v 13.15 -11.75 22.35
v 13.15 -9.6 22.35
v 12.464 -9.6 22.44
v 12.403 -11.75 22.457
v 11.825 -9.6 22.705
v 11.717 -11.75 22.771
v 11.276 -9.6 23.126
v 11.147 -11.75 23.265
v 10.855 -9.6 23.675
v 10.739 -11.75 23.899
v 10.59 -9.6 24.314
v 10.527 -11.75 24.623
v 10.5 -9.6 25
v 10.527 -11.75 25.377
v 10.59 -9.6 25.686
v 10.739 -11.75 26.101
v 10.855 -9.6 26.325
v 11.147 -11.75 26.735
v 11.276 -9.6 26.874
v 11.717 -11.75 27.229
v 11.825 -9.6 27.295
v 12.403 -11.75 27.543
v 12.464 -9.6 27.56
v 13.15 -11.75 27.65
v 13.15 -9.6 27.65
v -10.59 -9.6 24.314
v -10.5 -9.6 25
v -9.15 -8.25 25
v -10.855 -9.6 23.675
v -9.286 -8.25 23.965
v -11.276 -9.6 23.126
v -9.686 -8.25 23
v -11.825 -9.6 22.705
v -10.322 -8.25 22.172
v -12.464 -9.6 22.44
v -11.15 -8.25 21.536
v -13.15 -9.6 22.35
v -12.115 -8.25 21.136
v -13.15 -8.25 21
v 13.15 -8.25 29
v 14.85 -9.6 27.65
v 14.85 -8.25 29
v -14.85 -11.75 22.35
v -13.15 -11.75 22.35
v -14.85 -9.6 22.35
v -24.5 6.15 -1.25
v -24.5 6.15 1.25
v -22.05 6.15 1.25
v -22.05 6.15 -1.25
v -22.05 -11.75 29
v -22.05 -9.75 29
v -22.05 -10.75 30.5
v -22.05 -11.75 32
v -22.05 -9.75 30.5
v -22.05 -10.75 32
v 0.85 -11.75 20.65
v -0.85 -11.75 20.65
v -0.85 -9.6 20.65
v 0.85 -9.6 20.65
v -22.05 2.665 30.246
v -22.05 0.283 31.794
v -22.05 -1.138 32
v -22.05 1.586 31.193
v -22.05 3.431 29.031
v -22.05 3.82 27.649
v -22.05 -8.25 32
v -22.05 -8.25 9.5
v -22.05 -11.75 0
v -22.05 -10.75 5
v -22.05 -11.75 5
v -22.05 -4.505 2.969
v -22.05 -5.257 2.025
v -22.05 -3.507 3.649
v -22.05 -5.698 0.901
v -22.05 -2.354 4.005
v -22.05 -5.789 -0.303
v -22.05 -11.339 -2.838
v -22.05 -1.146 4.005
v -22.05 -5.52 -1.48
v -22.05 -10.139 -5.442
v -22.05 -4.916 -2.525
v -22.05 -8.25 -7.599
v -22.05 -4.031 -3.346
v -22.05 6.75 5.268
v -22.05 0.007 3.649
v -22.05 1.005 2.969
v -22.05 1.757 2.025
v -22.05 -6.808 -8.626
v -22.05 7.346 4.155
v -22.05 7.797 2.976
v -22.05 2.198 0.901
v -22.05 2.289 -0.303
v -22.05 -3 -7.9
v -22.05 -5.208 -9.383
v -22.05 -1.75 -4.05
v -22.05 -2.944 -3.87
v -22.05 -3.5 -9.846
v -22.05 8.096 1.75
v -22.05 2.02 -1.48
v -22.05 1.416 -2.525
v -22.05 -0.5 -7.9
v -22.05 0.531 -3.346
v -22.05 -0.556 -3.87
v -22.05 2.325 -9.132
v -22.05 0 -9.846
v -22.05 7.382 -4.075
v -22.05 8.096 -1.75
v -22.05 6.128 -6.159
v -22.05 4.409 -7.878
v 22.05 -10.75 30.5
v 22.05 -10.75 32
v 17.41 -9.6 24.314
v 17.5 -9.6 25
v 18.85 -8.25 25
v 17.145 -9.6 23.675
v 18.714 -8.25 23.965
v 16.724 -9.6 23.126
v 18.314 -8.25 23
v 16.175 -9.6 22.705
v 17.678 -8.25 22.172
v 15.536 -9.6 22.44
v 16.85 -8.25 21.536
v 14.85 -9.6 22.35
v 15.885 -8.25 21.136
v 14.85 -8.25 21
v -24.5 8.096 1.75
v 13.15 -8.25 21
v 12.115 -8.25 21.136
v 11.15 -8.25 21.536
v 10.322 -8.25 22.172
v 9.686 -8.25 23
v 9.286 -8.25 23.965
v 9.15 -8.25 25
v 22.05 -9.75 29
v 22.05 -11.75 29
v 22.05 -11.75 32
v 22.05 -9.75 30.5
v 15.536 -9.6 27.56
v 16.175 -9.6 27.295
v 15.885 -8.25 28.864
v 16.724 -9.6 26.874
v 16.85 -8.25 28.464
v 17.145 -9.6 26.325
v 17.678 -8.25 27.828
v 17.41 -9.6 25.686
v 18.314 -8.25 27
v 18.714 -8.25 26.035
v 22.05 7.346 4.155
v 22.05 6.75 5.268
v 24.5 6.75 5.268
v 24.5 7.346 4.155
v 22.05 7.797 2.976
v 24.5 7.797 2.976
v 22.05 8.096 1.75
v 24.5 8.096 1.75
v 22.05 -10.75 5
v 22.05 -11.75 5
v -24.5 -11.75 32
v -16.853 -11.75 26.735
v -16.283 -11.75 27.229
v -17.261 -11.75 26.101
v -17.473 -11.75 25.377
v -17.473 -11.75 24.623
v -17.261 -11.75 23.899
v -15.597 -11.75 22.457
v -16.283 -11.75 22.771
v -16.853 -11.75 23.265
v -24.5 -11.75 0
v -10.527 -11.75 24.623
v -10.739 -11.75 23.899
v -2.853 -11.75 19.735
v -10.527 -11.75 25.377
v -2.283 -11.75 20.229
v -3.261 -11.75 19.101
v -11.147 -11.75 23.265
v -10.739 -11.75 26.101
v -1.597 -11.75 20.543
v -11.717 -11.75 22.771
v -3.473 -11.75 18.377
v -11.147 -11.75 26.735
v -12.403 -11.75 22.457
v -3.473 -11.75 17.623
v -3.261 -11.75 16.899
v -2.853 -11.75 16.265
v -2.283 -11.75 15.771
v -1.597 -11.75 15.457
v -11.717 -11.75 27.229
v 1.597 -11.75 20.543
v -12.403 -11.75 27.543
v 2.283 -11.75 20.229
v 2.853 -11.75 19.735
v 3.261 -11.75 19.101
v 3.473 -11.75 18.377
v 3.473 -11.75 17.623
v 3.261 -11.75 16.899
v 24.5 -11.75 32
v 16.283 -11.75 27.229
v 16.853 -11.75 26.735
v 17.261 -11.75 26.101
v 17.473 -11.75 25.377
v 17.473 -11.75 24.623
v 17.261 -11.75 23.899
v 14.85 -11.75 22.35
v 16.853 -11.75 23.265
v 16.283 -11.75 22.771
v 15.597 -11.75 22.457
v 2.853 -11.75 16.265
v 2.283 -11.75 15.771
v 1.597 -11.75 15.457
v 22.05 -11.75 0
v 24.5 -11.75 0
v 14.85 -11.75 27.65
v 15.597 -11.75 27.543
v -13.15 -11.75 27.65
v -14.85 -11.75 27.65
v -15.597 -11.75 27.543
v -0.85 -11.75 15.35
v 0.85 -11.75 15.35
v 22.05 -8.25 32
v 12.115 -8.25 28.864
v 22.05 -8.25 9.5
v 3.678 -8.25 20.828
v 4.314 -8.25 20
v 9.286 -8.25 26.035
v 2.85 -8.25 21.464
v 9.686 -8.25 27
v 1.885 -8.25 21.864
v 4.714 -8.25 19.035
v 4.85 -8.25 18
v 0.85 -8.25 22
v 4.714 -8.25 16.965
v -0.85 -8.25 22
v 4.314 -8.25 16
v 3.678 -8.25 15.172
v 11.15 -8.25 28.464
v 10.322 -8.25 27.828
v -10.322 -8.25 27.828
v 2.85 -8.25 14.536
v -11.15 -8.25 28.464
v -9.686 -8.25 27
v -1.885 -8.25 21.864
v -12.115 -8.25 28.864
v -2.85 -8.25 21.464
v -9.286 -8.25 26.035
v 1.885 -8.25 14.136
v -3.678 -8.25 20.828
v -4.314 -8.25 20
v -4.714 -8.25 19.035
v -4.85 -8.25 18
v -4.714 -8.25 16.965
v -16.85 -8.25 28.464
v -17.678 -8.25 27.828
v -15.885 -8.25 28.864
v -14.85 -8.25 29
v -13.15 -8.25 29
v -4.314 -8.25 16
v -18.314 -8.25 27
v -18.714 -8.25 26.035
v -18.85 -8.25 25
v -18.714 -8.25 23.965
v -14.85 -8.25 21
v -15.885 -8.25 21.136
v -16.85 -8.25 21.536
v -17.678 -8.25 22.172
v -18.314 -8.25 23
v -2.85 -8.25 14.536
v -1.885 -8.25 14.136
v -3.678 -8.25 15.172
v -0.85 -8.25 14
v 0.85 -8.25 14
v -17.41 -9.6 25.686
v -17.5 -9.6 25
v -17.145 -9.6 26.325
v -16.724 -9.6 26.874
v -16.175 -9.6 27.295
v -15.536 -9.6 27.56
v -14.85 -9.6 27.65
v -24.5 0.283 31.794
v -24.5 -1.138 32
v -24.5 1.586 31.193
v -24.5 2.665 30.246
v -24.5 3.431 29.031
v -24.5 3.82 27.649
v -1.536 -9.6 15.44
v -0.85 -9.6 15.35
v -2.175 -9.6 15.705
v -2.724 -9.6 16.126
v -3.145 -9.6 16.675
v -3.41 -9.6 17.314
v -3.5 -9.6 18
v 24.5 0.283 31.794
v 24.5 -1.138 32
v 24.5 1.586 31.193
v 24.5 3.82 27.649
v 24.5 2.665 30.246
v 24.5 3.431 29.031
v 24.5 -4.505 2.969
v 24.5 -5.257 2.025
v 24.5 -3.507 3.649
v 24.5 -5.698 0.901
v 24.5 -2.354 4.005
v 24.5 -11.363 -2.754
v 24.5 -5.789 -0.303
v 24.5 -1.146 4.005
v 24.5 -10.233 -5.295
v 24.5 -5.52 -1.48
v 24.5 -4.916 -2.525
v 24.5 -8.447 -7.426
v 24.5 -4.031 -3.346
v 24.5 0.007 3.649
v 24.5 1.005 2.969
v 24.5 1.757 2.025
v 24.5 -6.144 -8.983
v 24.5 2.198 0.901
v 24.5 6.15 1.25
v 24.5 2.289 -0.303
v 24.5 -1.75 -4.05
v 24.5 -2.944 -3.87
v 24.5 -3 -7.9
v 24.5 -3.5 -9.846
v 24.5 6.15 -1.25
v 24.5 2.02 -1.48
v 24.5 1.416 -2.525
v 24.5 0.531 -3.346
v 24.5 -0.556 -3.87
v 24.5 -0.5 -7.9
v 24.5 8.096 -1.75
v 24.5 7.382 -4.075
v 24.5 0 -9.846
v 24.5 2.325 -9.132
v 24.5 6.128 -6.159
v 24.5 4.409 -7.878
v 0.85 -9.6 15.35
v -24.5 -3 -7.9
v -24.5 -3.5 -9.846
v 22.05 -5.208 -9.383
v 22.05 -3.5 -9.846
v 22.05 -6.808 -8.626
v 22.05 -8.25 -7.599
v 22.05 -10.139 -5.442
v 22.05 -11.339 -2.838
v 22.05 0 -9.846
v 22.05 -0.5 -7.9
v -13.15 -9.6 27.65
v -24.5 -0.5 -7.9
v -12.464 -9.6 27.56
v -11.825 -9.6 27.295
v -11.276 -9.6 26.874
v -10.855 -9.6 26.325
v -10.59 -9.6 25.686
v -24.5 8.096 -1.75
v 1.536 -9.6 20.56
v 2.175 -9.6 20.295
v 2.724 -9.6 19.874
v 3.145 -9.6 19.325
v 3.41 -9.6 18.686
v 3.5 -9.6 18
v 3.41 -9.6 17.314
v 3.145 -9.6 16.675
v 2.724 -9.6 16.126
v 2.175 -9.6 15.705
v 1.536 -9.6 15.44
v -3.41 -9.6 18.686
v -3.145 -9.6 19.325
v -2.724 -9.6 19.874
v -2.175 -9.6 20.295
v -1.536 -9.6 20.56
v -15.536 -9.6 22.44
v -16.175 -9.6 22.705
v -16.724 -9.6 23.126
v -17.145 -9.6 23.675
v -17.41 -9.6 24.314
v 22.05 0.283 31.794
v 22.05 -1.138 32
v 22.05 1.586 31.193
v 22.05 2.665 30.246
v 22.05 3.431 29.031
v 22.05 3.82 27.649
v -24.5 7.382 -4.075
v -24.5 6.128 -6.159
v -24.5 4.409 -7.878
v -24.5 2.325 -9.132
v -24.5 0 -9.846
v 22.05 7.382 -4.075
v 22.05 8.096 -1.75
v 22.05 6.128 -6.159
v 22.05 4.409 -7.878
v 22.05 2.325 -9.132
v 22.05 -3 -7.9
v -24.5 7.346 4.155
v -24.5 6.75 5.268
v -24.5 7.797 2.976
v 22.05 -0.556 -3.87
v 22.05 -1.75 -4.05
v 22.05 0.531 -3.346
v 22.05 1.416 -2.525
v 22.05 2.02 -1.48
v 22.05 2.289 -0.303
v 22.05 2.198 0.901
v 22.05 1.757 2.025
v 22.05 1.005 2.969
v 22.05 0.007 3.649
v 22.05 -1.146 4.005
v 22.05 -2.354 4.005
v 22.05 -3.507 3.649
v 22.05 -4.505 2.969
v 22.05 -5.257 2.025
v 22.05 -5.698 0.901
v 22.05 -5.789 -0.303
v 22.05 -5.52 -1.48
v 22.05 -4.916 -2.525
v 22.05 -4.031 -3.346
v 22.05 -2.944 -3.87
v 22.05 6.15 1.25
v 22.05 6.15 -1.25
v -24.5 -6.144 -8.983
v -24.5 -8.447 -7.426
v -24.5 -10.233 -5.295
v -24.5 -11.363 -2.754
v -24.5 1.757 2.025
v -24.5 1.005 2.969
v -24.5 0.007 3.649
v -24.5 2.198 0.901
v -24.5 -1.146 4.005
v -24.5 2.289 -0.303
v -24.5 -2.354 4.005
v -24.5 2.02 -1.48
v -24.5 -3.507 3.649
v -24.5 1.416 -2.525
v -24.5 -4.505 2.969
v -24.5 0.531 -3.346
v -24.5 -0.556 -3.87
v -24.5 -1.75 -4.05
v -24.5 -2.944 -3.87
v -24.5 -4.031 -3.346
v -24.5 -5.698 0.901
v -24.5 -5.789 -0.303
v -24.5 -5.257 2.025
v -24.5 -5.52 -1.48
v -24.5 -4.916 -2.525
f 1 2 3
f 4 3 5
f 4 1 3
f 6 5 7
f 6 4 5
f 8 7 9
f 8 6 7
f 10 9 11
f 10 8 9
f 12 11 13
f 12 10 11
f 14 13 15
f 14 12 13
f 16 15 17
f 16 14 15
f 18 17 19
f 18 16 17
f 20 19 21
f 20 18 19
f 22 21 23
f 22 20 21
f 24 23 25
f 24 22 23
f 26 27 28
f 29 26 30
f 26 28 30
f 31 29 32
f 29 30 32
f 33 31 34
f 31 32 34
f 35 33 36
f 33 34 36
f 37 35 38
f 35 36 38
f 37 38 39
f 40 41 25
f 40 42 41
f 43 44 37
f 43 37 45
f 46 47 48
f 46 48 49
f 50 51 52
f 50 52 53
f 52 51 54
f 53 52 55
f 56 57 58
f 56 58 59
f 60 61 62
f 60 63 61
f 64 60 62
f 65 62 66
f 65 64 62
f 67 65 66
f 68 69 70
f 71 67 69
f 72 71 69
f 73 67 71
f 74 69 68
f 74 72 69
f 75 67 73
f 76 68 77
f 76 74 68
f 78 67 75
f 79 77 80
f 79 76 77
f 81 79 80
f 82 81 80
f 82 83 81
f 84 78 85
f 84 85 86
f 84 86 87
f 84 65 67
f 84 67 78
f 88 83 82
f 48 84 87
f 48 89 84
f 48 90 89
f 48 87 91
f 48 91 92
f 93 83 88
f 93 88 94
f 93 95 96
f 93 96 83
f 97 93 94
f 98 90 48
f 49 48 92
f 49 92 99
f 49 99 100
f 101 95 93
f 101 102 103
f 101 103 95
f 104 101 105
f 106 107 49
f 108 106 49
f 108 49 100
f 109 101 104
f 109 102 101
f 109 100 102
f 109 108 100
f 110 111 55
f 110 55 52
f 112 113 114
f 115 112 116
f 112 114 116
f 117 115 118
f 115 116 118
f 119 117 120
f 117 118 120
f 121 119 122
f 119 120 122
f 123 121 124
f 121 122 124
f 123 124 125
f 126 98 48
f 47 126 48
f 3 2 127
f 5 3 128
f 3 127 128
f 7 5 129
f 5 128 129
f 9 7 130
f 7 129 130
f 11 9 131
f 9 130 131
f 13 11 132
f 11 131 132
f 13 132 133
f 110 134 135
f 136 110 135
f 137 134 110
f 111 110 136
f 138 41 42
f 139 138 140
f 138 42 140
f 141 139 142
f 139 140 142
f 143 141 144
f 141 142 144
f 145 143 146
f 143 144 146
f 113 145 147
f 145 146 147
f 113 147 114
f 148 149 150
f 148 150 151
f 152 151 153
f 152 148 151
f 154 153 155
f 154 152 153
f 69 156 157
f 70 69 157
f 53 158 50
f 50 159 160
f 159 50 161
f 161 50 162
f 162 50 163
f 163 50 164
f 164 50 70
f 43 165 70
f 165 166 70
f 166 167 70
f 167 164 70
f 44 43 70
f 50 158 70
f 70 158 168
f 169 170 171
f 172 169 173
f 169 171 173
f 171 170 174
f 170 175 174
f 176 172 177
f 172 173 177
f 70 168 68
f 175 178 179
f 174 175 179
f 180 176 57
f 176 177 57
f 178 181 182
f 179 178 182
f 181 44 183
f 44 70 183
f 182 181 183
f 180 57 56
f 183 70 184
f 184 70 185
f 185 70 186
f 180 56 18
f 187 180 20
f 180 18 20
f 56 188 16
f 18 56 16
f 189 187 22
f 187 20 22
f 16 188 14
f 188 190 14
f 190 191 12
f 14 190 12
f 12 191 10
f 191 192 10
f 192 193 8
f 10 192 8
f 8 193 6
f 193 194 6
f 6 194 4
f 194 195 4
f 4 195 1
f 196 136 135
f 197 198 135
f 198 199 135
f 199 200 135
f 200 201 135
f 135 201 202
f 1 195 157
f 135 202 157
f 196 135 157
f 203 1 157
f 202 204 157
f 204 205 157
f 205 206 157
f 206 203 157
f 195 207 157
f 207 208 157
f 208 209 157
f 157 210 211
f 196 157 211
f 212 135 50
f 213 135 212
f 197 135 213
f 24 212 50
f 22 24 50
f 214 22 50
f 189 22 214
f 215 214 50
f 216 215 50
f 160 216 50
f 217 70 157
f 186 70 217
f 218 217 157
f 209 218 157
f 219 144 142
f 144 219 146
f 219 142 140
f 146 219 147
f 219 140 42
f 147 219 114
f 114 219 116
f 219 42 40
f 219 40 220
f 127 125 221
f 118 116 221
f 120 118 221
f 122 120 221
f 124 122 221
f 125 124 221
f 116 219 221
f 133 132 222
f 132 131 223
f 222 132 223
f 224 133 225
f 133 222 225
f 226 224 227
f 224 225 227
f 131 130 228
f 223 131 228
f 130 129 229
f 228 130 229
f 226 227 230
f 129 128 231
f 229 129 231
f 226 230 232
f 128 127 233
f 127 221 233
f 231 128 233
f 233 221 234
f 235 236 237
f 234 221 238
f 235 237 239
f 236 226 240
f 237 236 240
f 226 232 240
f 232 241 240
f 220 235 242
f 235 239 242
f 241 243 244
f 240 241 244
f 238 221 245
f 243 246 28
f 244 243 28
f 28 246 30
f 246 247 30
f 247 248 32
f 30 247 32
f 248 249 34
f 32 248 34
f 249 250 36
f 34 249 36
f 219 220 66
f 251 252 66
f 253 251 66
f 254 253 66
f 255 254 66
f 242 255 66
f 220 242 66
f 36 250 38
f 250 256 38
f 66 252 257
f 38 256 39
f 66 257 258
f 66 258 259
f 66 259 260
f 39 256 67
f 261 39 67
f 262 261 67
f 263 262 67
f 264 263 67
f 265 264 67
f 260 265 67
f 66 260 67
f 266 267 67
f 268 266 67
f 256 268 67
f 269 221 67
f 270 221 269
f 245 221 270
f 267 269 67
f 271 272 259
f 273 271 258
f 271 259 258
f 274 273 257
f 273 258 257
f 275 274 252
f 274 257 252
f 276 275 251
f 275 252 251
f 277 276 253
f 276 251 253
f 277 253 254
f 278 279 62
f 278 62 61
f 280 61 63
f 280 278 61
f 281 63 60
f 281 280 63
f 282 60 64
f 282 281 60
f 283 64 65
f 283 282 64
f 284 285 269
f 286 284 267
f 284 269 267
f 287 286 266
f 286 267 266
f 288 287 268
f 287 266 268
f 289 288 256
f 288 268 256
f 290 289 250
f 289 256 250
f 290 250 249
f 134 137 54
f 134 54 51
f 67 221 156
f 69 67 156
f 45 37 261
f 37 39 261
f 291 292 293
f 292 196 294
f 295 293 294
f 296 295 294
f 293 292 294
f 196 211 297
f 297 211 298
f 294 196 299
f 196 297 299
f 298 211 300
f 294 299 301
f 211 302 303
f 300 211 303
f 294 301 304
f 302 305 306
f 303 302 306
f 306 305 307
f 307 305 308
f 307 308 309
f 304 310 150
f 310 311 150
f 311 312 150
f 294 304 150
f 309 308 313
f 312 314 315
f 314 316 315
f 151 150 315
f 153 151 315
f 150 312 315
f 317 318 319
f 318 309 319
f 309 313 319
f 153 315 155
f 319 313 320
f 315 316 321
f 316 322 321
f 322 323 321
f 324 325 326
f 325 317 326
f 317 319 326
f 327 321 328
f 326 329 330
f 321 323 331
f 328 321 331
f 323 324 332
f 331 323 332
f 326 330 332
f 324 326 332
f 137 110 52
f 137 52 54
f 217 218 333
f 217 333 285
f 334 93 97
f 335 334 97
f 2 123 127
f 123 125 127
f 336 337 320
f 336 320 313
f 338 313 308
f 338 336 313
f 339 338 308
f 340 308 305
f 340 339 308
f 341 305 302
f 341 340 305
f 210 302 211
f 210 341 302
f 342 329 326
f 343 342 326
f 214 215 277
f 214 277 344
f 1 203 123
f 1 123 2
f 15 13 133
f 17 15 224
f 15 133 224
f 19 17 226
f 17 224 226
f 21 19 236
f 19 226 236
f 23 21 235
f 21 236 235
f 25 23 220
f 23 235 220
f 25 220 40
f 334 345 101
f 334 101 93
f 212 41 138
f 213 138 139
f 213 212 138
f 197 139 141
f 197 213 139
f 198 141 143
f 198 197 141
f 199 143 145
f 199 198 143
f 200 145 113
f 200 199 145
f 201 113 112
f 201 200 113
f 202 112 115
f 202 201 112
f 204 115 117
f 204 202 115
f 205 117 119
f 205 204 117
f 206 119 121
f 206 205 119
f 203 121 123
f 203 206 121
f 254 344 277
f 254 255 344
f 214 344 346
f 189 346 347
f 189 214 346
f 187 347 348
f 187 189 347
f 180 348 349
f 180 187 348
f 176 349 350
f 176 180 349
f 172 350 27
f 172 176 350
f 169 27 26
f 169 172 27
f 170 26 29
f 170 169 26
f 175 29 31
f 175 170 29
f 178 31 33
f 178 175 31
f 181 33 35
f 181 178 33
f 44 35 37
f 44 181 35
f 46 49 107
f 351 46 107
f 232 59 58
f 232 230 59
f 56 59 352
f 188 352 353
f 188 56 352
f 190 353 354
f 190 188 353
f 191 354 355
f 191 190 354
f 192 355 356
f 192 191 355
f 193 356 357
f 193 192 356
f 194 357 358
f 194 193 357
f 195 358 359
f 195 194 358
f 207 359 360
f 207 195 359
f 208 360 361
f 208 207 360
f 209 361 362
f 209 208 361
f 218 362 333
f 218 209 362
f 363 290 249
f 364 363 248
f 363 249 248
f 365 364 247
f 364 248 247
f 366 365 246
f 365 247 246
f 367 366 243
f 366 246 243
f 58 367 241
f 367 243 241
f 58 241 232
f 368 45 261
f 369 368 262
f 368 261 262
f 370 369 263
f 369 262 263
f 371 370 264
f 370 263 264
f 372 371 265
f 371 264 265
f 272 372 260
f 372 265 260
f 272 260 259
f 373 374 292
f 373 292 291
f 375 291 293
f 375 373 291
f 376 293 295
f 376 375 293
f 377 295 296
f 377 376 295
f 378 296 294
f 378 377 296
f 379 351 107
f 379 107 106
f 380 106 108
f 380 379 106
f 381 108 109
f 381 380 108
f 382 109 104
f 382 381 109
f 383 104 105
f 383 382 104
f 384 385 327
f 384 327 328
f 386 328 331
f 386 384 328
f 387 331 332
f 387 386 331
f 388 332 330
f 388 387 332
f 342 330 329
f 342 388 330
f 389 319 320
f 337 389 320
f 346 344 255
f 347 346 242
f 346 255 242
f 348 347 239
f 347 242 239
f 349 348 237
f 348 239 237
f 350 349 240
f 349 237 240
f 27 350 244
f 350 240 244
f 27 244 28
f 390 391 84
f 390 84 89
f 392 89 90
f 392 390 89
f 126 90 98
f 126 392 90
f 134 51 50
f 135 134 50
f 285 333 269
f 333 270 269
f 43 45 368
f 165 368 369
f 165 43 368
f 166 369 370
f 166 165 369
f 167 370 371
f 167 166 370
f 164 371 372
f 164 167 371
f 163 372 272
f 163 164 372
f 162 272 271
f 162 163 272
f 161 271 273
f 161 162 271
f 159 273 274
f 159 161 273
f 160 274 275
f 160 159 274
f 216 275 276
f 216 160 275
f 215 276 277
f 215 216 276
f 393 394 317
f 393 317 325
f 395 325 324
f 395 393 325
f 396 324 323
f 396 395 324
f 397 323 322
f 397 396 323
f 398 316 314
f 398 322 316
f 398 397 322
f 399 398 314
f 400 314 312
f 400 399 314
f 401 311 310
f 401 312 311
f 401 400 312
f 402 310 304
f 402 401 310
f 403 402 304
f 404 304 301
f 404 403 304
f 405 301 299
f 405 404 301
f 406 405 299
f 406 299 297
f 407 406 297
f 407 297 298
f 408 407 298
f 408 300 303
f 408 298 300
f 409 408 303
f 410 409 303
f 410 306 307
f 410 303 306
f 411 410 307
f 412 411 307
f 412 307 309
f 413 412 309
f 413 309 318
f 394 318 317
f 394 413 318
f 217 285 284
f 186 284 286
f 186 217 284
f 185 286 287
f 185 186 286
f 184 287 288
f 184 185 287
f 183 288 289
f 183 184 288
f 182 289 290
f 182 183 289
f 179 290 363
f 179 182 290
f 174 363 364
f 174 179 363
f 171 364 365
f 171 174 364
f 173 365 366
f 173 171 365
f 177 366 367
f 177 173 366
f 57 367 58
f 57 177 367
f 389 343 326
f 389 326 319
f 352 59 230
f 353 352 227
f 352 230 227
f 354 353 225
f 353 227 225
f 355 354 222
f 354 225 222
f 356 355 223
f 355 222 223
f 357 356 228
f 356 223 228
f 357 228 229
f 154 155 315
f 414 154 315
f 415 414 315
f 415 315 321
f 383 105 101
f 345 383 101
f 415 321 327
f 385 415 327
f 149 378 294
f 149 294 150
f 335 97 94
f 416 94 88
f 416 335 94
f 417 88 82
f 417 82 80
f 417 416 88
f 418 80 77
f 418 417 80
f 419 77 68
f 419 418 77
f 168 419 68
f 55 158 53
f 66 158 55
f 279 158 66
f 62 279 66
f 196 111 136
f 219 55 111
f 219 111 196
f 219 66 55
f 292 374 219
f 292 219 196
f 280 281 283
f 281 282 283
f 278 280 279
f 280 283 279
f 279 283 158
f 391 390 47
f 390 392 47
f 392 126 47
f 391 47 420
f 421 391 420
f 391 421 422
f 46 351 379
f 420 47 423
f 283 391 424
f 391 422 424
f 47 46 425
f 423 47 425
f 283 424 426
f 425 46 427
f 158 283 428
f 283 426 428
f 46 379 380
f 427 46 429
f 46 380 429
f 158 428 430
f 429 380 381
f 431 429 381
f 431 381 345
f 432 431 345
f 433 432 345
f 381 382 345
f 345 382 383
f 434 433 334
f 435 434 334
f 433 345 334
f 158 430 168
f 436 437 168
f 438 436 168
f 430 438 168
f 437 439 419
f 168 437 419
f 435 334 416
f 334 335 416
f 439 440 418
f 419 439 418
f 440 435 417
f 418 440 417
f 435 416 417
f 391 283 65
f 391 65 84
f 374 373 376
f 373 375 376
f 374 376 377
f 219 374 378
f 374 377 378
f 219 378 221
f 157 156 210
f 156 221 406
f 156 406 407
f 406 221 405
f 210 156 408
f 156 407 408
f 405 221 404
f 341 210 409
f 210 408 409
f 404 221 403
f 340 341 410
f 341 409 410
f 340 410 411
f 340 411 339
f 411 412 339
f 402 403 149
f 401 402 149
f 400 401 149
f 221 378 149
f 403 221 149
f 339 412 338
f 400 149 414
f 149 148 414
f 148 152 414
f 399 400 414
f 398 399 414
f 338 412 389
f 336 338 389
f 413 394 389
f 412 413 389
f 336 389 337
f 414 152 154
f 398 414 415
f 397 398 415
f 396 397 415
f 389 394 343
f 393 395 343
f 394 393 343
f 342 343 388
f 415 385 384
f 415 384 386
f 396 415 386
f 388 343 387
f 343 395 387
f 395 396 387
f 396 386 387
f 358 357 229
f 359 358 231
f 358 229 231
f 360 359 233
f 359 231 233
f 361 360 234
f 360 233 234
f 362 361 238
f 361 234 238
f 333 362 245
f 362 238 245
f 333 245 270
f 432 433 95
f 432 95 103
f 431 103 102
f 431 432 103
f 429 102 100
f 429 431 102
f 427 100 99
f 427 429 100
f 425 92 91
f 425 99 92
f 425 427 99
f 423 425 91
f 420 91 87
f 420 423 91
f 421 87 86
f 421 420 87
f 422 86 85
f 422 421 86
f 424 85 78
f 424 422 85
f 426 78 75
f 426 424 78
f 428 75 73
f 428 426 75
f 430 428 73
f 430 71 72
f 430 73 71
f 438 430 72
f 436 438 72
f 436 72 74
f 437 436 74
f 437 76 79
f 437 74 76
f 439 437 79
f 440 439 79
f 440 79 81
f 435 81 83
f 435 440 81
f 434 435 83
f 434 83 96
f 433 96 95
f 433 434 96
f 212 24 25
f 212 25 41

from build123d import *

# Parameters (mm, degrees)
BODY_DEPTH                       = 32
BODY_DEPTH_BACK                  = 15
PIVOT_HOLE_DEPTH                 = 42.979905907
PIVOT_HOLE_DEPTH_BACK            = 42.979905907
PIVOT_HOLE_SKETCH_R              = 4.05
OUTSIDE_SHAPE_CUT_OUT_DEPTH      = 42.979905907
OUTSIDE_SHAPE_CUT_OUT_DEPTH_BACK = 42.979905907
OUTSIDE_SHAPE_CUT_OUT_SKETCH_W   = 49
OUTSIDE_SHAPE_CUT_OUT_SKETCH_H   = 22
INSIDE_START                     = 22.05
INSIDE_SHAPE_CUT_OUT_DEPTH       = 44.1
F_3_START                        = -11.75
F_3_M5_SLOTS_DEPTH               = 3.5


with BuildPart() as part:
    # Profile Sketch → Body (new, two sides: drawn at the far end of the back side and taken through both)
    with BuildSketch(Plane.XY.offset(-BODY_DEPTH_BACK)):
        Polygon((-24.5, -11.75), (24.5, -11.75), (24.5, 8.25), (22.05, 8.25), (22.05, -8.25), (-22.05, -8.25), (-22.05, 8.25), (-24.5, 8.25), align=None)
    extrude(amount=BODY_DEPTH + BODY_DEPTH_BACK)

    # Pivot Hole Sketch → Pivot Hole (cut, two sides: drawn at the far end of the back side and taken through both)
    with BuildSketch(Plane(origin=(0, 0, 0), x_dir=(0, 0, -1), z_dir=(1, 0, 0)).offset(-PIVOT_HOLE_DEPTH_BACK)):
        with Locations((0, -1.75)):
            Circle(PIVOT_HOLE_SKETCH_R)
    extrude(amount=PIVOT_HOLE_DEPTH + PIVOT_HOLE_DEPTH_BACK, mode=Mode.SUBTRACT)

    # Outside Shape Cut Out Sketch → Outside Shape Cut Out (cut, two sides: drawn at the far end of the back side and taken through both)
    with BuildSketch(Plane(origin=(0, 0, 0), x_dir=(0, 0, -1), z_dir=(1, 0, 0)).offset(-OUTSIDE_SHAPE_CUT_OUT_DEPTH_BACK)):
        with Locations((-9.5, -2.75)):
            Rectangle(OUTSIDE_SHAPE_CUT_OUT_SKETCH_W, OUTSIDE_SHAPE_CUT_OUT_SKETCH_H)
        with BuildLine():
            Line((-27.649101987, 3.819656009), (-5.267826876, 6.75))
            ThreePointArc((-5.267826876, 6.75), (-3.57284062, 7.589957703), (-1.75, 8.095684334))
            Line((-1.75, 8.095684334), (-1.25, 6.15))
            Line((-1.25, 6.15), (1.25, 6.15))
            Line((1.25, 6.15), (1.75, 8.095684334))
            ThreePointArc((1.75, 8.095684334), (7.071067812, 5.321067812), (9.845684334, 0))
            Line((9.845684334, 0), (7.9, -0.5))
            Line((7.9, -0.5), (7.9, -3))
            Line((7.9, -3), (9.845684334, -3.5))
            ThreePointArc((9.845684334, -3.5), (6.422616289, -9.414854858), (0, -11.75))
            Line((0, -11.75), (-32, -11.75))
            Line((-32, -11.75), (-32, -1.138031619))
            ThreePointArc((-32, -1.138031619), (-30.758025408, 2.160035244), (-27.649101987, 3.819656009))
        make_face(mode=Mode.SUBTRACT)
    extrude(amount=OUTSIDE_SHAPE_CUT_OUT_DEPTH + OUTSIDE_SHAPE_CUT_OUT_DEPTH_BACK, mode=Mode.SUBTRACT)

    # Inside Shape Cut Out Sketch → Inside Shape Cut Out (cut)
    with BuildSketch(Plane(origin=(0, 0, 0), x_dir=(0, 0, -1), z_dir=(1, 0, 0)).offset(INSIDE_START)):
        Polygon((-29, -9.75), (-29, -11.75), (-32, -11.75), (-32, -10.75), (-30.5, -10.75), (-30.5, -9.75), align=None)
        Polygon((-9.5, -8.25), (-5, -10.75), (-5, -11.75), (7.599342077, -11.75), (7.599342077, -8.25), align=None)
    extrude(amount=-INSIDE_SHAPE_CUT_OUT_DEPTH, mode=Mode.SUBTRACT)

    # 3 M5 Slots: read off the stored shape, not the designer's step
    # 3 M5 Slots outline → 3 M5 Slots (cut)
    with BuildSketch(Plane(origin=(0, 0, 0), x_dir=(1, 0, 0), z_dir=(0, 1, 0)).offset(F_3_START)):
        with BuildLine():
            Line((-0.85, -20.65), (0.85, -20.65))
            ThreePointArc((0.85, -20.65), (3.5, -18), (0.85, -15.35))
            Line((0.85, -15.35), (-0.85, -15.35))
            ThreePointArc((-0.85, -15.35), (-3.5, -18), (-0.85, -20.65))
        make_face()
        with BuildLine():
            Line((13.15, -27.65), (14.85, -27.65))
            ThreePointArc((14.85, -27.65), (17.5, -25), (14.85, -22.35))
            Line((14.85, -22.35), (13.15, -22.35))
            ThreePointArc((13.15, -22.35), (10.5, -25), (13.15, -27.65))
        make_face()
        with BuildLine():
            ThreePointArc((-13.15, -27.65), (-10.5, -25), (-13.15, -22.35))
            Line((-13.15, -22.35), (-14.85, -22.35))
            ThreePointArc((-14.85, -22.35), (-17.5, -25), (-14.85, -27.65))
            Line((-14.85, -27.65), (-13.15, -27.65))
        make_face()
    extrude(amount=F_3_M5_SLOTS_DEPTH, mode=Mode.SUBTRACT)

    # 3 M5 Slots 2: loft between two sections, ruled curve by curve
    f_3_m5_slots_2_from = [
        Edge.make_three_point_arc((0.85, -9.6, 20.65), (2.72383297, -9.6, 19.87383297), (3.5, -9.6, 18)),
        Edge.make_three_point_arc((3.5, -9.6, 18), (2.72383297, -9.6, 16.12616703), (0.85, -9.6, 15.35)),
        Edge.make_three_point_arc((-0.85, -9.6, 15.35), (-2.72383297, -9.6, 16.12616703), (-3.5, -9.6, 18)),
        Edge.make_three_point_arc((-3.5, -9.6, 18), (-2.72383297, -9.6, 19.87383297), (-0.85, -9.6, 20.65)),
        Edge.make_line((0.85, -9.6, 15.35), (-0.85, -9.6, 15.35)),
        Edge.make_line((0.85, -9.6, 20.65), (-0.85, -9.6, 20.65)),
    ]
    f_3_m5_slots_2_to = [
        Edge.make_three_point_arc((0.85, -8.25, 22), (3.678427125, -8.25, 20.828427125), (4.85, -8.25, 18)),
        Edge.make_three_point_arc((4.85, -8.25, 18), (3.678427125, -8.25, 15.171572875), (0.85, -8.25, 14)),
        Edge.make_three_point_arc((-0.85, -8.25, 14), (-3.678427125, -8.25, 15.171572875), (-4.85, -8.25, 18)),
        Edge.make_three_point_arc((-4.85, -8.25, 18), (-3.678427125, -8.25, 20.828427125), (-0.85, -8.25, 22)),
        Edge.make_line((0.85, -8.25, 14), (-0.85, -8.25, 14)),
        Edge.make_line((0.85, -8.25, 22), (-0.85, -8.25, 22)),
    ]
    f_3_m5_slots_2 = Solid(Shell([*[Face.make_surface_from_curves(f_3_m5_slots_2_from[k], f_3_m5_slots_2_to[k]) for k in range(6)], Face(Wire(f_3_m5_slots_2_from)), Face(Wire(f_3_m5_slots_2_to))]))
    add(f_3_m5_slots_2, mode=Mode.SUBTRACT)

    # 3 M5 Slots 3: loft between two sections, ruled curve by curve
    f_3_m5_slots_3_from = [
        Edge.make_three_point_arc((14.85, -9.6, 27.65), (16.72383297, -9.6, 26.87383297), (17.5, -9.6, 25)),
        Edge.make_three_point_arc((17.5, -9.6, 25), (16.72383297, -9.6, 23.12616703), (14.85, -9.6, 22.35)),
        Edge.make_three_point_arc((13.15, -9.6, 22.35), (11.27616703, -9.6, 23.12616703), (10.5, -9.6, 25)),
        Edge.make_three_point_arc((10.5, -9.6, 25), (11.27616703, -9.6, 26.87383297), (13.15, -9.6, 27.65)),
        Edge.make_line((14.85, -9.6, 22.35), (13.15, -9.6, 22.35)),
        Edge.make_line((14.85, -9.6, 27.65), (13.15, -9.6, 27.65)),
    ]
    f_3_m5_slots_3_to = [
        Edge.make_three_point_arc((14.85, -8.25, 29), (17.678427125, -8.25, 27.828427125), (18.85, -8.25, 25)),
        Edge.make_three_point_arc((18.85, -8.25, 25), (17.678427125, -8.25, 22.171572875), (14.85, -8.25, 21)),
        Edge.make_three_point_arc((13.15, -8.25, 21), (10.321572875, -8.25, 22.171572875), (9.15, -8.25, 25)),
        Edge.make_three_point_arc((9.15, -8.25, 25), (10.321572875, -8.25, 27.828427125), (13.15, -8.25, 29)),
        Edge.make_line((14.85, -8.25, 21), (13.15, -8.25, 21)),
        Edge.make_line((14.85, -8.25, 29), (13.15, -8.25, 29)),
    ]
    f_3_m5_slots_3 = Solid(Shell([*[Face.make_surface_from_curves(f_3_m5_slots_3_from[k], f_3_m5_slots_3_to[k]) for k in range(6)], Face(Wire(f_3_m5_slots_3_from)), Face(Wire(f_3_m5_slots_3_to))]))
    add(f_3_m5_slots_3, mode=Mode.SUBTRACT)

    # 3 M5 Slots 4: loft between two sections, ruled curve by curve
    f_3_m5_slots_4_from = [
        Edge.make_three_point_arc((-13.15, -9.6, 27.65), (-11.27616703, -9.6, 26.87383297), (-10.5, -9.6, 25)),
        Edge.make_three_point_arc((-10.5, -9.6, 25), (-11.27616703, -9.6, 23.12616703), (-13.15, -9.6, 22.35)),
        Edge.make_three_point_arc((-14.85, -9.6, 22.35), (-16.72383297, -9.6, 23.12616703), (-17.5, -9.6, 25)),
        Edge.make_three_point_arc((-17.5, -9.6, 25), (-16.72383297, -9.6, 26.87383297), (-14.85, -9.6, 27.65)),
        Edge.make_line((-13.15, -9.6, 22.35), (-14.85, -9.6, 22.35)),
        Edge.make_line((-13.15, -9.6, 27.65), (-14.85, -9.6, 27.65)),
    ]
    f_3_m5_slots_4_to = [
        Edge.make_three_point_arc((-13.15, -8.25, 29), (-10.321572875, -8.25, 27.828427125), (-9.15, -8.25, 25)),
        Edge.make_three_point_arc((-9.15, -8.25, 25), (-10.321572875, -8.25, 22.171572875), (-13.15, -8.25, 21)),
        Edge.make_three_point_arc((-14.85, -8.25, 21), (-17.678427125, -8.25, 22.171572875), (-18.85, -8.25, 25)),
        Edge.make_three_point_arc((-18.85, -8.25, 25), (-17.678427125, -8.25, 27.828427125), (-14.85, -8.25, 29)),
        Edge.make_line((-13.15, -8.25, 21), (-14.85, -8.25, 21)),
        Edge.make_line((-13.15, -8.25, 29), (-14.85, -8.25, 29)),
    ]
    f_3_m5_slots_4 = Solid(Shell([*[Face.make_surface_from_curves(f_3_m5_slots_4_from[k], f_3_m5_slots_4_to[k]) for k in range(6)], Face(Wire(f_3_m5_slots_4_from)), Face(Wire(f_3_m5_slots_4_to))]))
    add(f_3_m5_slots_4, mode=Mode.SUBTRACT)


solid = part.part
